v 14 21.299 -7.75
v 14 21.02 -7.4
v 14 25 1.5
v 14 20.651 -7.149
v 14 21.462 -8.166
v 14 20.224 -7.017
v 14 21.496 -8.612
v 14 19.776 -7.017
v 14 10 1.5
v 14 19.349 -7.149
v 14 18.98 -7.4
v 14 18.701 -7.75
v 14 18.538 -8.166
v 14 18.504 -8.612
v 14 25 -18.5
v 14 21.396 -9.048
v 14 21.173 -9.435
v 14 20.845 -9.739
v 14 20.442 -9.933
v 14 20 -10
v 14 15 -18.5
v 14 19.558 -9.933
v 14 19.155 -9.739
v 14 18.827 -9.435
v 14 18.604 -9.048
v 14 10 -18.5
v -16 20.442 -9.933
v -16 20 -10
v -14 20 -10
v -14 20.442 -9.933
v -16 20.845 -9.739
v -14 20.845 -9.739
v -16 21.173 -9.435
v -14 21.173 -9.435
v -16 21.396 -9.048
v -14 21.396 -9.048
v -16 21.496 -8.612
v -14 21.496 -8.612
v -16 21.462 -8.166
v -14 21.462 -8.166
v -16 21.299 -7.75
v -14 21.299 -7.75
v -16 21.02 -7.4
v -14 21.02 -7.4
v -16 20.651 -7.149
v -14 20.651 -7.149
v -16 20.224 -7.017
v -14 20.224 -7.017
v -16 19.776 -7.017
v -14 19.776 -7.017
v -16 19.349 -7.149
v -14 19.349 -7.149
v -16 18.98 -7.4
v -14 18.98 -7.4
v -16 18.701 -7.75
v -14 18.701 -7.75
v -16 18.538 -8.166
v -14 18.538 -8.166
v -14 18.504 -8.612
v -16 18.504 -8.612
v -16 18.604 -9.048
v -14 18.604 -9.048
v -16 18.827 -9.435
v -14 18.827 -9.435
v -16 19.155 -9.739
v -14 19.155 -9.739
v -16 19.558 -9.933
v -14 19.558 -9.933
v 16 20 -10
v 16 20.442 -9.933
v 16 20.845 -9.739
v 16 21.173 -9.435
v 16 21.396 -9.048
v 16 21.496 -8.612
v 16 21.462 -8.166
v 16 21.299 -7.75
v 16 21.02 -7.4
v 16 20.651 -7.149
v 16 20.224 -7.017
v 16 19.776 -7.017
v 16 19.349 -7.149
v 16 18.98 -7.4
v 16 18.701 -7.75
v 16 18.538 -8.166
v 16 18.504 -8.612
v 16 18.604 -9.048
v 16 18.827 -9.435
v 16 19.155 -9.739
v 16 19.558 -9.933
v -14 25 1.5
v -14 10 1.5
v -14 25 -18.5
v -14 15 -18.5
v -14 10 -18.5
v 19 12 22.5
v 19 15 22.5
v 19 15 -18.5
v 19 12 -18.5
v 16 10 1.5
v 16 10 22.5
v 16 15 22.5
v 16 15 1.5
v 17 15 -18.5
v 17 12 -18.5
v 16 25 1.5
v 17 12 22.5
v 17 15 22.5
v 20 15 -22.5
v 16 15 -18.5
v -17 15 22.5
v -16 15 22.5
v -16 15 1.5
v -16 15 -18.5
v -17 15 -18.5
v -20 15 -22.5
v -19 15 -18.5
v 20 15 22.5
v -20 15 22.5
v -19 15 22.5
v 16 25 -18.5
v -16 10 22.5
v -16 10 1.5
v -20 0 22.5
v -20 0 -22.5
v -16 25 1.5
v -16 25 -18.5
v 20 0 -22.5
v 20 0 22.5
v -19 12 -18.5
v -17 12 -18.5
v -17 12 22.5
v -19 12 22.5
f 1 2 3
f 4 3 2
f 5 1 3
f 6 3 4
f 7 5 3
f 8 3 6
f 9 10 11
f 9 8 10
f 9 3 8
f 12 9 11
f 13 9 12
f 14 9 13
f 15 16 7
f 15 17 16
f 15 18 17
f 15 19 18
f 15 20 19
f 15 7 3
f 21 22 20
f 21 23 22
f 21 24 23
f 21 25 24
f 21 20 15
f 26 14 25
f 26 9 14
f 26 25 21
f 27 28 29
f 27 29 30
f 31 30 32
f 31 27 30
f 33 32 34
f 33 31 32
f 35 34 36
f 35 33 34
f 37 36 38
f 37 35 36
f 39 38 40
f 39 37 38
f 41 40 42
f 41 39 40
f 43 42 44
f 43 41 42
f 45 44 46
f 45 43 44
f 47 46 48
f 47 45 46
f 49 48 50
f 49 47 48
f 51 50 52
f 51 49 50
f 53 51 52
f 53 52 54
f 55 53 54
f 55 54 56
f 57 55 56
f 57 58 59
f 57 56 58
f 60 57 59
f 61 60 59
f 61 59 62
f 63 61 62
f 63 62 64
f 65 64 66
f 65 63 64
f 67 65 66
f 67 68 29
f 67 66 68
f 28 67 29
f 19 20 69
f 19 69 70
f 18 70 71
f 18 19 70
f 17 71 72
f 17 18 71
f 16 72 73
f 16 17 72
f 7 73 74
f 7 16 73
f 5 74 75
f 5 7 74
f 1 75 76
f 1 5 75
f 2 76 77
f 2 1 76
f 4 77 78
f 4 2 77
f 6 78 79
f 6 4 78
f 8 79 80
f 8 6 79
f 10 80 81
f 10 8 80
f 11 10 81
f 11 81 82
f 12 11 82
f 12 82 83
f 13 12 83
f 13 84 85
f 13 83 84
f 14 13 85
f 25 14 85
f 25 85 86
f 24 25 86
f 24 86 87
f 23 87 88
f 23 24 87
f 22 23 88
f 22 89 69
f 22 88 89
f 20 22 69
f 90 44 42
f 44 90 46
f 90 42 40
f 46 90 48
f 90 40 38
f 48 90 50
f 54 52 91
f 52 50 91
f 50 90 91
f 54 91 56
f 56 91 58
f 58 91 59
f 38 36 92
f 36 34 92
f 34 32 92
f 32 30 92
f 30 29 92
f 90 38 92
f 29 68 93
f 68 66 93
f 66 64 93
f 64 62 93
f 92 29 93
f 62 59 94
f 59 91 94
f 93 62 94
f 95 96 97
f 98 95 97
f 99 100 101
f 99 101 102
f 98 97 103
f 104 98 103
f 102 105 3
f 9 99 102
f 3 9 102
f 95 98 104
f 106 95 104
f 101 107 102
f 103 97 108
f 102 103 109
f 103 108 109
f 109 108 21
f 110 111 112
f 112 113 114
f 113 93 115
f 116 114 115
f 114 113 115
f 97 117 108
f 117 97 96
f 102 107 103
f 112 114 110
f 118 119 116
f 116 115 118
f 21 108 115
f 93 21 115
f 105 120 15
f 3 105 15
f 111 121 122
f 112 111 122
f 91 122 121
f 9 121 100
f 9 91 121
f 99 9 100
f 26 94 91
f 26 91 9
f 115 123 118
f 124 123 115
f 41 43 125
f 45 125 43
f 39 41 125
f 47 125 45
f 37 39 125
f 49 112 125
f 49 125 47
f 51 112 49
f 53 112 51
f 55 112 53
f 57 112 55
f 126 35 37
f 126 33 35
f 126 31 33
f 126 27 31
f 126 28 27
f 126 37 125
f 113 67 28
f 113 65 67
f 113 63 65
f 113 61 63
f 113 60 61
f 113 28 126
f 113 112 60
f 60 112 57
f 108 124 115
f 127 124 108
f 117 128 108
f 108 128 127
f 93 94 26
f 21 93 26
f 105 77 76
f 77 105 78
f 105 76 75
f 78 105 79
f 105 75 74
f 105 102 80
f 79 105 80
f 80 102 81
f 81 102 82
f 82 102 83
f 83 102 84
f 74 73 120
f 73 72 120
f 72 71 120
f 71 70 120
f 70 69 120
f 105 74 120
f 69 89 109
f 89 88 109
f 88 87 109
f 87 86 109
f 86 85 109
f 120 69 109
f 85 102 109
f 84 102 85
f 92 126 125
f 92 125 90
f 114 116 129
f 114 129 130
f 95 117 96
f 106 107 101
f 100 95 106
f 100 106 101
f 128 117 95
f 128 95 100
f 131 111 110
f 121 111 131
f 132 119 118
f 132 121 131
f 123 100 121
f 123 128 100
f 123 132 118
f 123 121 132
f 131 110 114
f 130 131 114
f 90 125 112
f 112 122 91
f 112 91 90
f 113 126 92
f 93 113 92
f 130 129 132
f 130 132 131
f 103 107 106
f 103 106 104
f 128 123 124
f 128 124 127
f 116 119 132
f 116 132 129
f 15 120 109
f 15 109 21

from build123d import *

# Parameters (mm, degrees)
SKETCH1_W               = 40
SKETCH1_H               = 45
BOSS_EXTRUDE1_DEPTH     = 10
SKETCH2_W               = 40
SKETCH2_H               = 4
BOSS_EXTRUDE2_DEPTH     = 5
SKETCH3_W               = 4
SKETCH3_H               = 41
BOSS_EXTRUDE3_DEPTH     = 5
SKETCH4_W               = 2
SKETCH4_H               = 41
CUT_EXTRUDE1_DEPTH      = 3
SKETCH5_W               = 2
SKETCH5_H               = 20
BOSS_EXTRUDE4_DEPTH     = 15
CUT_EXTRUDE2_DEPTH      = 50.267129001
CUT_EXTRUDE2_DEPTH_BACK = 50.267129001
SKETCH8_R               = 1.5


with BuildPart() as part:
    # Sketch1 → Boss-Extrude1 (new body)
    with BuildSketch(Plane(origin=(0, 0, 0), x_dir=(1, 0, 0), z_dir=(0, 1, 0))):
        Rectangle(SKETCH1_W, SKETCH1_H)
    extrude(amount=BOSS_EXTRUDE1_DEPTH)

    # Sketch2 → Boss-Extrude2 (add)
    with BuildSketch(Plane(origin=(0, 10, 0), x_dir=(1, 0, 0), z_dir=(0, 1, 0))):
        with Locations((0, 20.5)):
            Rectangle(SKETCH2_W, SKETCH2_H)
    extrude(amount=BOSS_EXTRUDE2_DEPTH)

    # Sketch3 → Boss-Extrude3 (add)
    with BuildSketch(Plane(origin=(0, 10, 0), x_dir=(1, 0, 0), z_dir=(0, 1, 0))):
        with Locations((-18, -2)):
            Rectangle(SKETCH3_W, SKETCH3_H)
    boss_extrude3 = extrude(amount=BOSS_EXTRUDE3_DEPTH)

    # Sketch4 → Cut-Extrude1 (cut)
    with BuildSketch(Plane(origin=(0, 15, 0), x_dir=(1, 0, 0), z_dir=(0, 1, 0))):
        with Locations((-18, -2)):
            Rectangle(SKETCH4_W, SKETCH4_H)
    cut_extrude1 = extrude(amount=-CUT_EXTRUDE1_DEPTH, mode=Mode.SUBTRACT)

    # Mirror1: Boss-Extrude3, Cut-Extrude1 across plane
    add(boss_extrude3.mirror(Plane(origin=(0, 0, 0), x_dir=(0, 0, 1), z_dir=(1, 0, 0))))
    add(cut_extrude1.mirror(Plane(origin=(0, 0, 0), x_dir=(0, 0, 1), z_dir=(1, 0, 0))), mode=Mode.SUBTRACT)

    # Sketch5 → Boss-Extrude4 (add)
    with BuildSketch(Plane(origin=(0, 10, 0), x_dir=(1, 0, 0), z_dir=(0, 1, 0))):
        with Locations((-15, 8.5)):
            Rectangle(SKETCH5_W, SKETCH5_H)
    boss_extrude4 = extrude(amount=BOSS_EXTRUDE4_DEPTH)

    # Mirror2: Boss-Extrude4 across plane
    add(boss_extrude4.mirror(Plane(origin=(0, 0, 0), x_dir=(0, 0, 1), z_dir=(1, 0, 0))))

    # Sketch8 → Cut-Extrude2 (cut, two sides: drawn at the far end of the back side and taken through both)
    with BuildSketch(Plane(origin=(16, 0, 0), x_dir=(0, 0, -1), z_dir=(1, 0, 0)).offset(-CUT_EXTRUDE2_DEPTH_BACK)):
        with Locations((8.5, 20)):
            Circle(SKETCH8_R)
    extrude(amount=CUT_EXTRUDE2_DEPTH + CUT_EXTRUDE2_DEPTH_BACK, mode=Mode.SUBTRACT)


solid = part.part
